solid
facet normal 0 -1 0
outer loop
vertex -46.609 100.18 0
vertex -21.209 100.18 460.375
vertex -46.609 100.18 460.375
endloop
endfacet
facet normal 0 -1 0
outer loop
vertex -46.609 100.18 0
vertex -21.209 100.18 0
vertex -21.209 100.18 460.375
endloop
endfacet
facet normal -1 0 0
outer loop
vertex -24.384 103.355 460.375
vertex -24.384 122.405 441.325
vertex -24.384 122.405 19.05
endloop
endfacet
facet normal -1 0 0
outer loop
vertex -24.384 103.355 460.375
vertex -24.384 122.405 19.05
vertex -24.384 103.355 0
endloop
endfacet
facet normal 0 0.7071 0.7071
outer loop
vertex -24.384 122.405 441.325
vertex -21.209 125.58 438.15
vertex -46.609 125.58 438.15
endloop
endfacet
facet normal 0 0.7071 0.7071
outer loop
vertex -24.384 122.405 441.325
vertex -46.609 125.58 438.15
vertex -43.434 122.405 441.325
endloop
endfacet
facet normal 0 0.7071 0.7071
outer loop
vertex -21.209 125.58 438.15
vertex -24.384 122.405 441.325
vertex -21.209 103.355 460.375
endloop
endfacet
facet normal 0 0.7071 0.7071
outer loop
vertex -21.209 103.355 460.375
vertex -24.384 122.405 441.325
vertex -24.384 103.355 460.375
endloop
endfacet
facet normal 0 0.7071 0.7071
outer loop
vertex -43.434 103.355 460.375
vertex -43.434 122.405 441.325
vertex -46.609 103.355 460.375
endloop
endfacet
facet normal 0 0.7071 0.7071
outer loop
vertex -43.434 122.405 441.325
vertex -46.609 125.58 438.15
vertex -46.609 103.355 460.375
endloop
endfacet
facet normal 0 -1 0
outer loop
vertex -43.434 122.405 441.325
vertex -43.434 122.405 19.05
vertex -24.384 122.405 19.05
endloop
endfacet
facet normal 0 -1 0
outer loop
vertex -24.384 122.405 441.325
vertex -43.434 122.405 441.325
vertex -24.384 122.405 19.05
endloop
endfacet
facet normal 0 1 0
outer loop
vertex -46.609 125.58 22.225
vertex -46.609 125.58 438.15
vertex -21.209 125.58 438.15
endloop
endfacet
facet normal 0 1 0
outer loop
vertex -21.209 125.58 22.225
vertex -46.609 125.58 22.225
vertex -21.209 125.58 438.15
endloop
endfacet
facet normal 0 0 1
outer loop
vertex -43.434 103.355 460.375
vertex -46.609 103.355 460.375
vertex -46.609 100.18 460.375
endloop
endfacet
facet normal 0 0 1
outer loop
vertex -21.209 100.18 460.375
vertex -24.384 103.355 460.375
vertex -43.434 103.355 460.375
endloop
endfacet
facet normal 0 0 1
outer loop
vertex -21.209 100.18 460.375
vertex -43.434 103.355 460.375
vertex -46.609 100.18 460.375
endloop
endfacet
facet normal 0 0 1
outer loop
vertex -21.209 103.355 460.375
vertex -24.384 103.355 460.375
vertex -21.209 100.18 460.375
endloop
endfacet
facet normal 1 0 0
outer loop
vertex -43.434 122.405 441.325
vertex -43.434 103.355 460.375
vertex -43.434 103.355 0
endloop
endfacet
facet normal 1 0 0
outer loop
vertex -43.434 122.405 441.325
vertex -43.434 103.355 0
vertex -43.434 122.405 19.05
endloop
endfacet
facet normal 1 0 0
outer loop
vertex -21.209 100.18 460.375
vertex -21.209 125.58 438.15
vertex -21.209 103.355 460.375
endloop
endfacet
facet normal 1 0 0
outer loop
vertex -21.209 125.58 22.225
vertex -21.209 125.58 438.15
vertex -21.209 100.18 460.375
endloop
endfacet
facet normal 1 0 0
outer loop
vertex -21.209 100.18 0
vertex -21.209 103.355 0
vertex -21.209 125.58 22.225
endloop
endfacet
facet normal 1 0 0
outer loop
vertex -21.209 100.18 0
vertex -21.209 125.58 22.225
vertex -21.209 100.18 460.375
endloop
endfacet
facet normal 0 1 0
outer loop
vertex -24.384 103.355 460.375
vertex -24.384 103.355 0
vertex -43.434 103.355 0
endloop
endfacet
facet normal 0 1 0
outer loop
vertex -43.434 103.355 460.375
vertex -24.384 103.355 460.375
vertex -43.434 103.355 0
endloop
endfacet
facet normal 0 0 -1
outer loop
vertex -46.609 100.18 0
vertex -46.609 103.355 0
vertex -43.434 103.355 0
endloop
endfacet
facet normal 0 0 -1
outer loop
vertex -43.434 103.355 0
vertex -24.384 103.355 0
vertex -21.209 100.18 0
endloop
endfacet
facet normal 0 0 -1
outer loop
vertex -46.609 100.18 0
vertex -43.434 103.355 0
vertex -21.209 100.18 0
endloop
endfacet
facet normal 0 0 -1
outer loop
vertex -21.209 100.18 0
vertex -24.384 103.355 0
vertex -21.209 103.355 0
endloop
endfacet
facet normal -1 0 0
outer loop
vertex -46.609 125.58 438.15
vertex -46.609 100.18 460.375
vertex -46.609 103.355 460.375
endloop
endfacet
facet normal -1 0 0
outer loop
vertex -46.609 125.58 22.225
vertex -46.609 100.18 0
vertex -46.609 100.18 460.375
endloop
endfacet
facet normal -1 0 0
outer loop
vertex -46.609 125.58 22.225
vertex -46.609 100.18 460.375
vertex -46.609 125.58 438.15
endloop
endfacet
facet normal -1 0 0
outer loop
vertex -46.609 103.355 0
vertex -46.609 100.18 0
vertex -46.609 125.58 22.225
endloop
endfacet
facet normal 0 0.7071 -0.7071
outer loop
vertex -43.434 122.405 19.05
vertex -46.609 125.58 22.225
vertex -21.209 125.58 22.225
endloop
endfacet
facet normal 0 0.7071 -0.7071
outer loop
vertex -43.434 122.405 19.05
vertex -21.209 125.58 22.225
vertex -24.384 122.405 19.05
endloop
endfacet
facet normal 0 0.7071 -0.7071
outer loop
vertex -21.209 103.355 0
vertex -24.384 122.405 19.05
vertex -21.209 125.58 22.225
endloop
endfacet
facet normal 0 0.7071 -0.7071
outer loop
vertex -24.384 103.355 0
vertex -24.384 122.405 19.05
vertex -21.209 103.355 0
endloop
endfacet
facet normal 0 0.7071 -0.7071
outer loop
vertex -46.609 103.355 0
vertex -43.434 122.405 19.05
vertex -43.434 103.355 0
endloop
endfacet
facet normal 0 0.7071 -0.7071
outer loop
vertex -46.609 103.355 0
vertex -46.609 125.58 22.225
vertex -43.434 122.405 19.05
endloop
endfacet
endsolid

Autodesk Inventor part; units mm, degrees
ref_plane "YZ Plane" through (0, 0, 0) normal (1, 0, 0) x (0, 1, 0)
ref_plane "XZ Plane" through (0, 0, 0) normal (0, 1, 0) x (-1, 0, 0)
ref_plane "XY Plane" through (0, 0, 0) normal (0, 0, 1) x (1, 0, 0)
sketch "Sketch1" plane through (0, 0, 0) normal (0, 0, 1) x (1, 0, 0)
  line L0 (-46.6093, 125.5803) -> (-21.2093, 125.5803)
  line L1 (-21.2093, 125.5803) -> (-21.2093, 100.1803)
  line L2 (-21.2093, 100.1803) -> (-46.6093, 100.1803)
  line L3 (-46.6093, 100.1803) -> (-46.6093, 125.5803)
  line L4 (-43.4343, 122.4053) -> (-24.3843, 122.4053)
  line L5 (-24.3843, 122.4053) -> (-24.3843, 103.3553)
  line L6 (-24.3843, 103.3553) -> (-43.4343, 103.3553)
  line L7 (-43.4343, 103.3553) -> (-43.4343, 122.4053)
  point P0 (0, 0)
  dimension "d0" = 25.4
  dimension "d1" = 25.4
  dimension "d2" = 3.175
extrude "Extrusion1" add sketch "Sketch1" along normal blind 460.375
sketch "Sketch2" plane through (-46.6093, 100.1803, 0) normal (-1, 0, 0) x (0, 0, 1)
  point P0 (0, -100.1803)
sketch "Sketch3" plane through (-46.6093, 100.1803, 0) normal (-1, 0, 0) x (0, 0, 1)
  point P0 (0, -100.1803)
chamfer "Chamfer1" distance 22.225 angle 45 2 edges at (-33.9093, 125.5803, 460.375) (-33.9093, 125.5803, 0)
properties part number "2018 Bottom Cross Bar"
